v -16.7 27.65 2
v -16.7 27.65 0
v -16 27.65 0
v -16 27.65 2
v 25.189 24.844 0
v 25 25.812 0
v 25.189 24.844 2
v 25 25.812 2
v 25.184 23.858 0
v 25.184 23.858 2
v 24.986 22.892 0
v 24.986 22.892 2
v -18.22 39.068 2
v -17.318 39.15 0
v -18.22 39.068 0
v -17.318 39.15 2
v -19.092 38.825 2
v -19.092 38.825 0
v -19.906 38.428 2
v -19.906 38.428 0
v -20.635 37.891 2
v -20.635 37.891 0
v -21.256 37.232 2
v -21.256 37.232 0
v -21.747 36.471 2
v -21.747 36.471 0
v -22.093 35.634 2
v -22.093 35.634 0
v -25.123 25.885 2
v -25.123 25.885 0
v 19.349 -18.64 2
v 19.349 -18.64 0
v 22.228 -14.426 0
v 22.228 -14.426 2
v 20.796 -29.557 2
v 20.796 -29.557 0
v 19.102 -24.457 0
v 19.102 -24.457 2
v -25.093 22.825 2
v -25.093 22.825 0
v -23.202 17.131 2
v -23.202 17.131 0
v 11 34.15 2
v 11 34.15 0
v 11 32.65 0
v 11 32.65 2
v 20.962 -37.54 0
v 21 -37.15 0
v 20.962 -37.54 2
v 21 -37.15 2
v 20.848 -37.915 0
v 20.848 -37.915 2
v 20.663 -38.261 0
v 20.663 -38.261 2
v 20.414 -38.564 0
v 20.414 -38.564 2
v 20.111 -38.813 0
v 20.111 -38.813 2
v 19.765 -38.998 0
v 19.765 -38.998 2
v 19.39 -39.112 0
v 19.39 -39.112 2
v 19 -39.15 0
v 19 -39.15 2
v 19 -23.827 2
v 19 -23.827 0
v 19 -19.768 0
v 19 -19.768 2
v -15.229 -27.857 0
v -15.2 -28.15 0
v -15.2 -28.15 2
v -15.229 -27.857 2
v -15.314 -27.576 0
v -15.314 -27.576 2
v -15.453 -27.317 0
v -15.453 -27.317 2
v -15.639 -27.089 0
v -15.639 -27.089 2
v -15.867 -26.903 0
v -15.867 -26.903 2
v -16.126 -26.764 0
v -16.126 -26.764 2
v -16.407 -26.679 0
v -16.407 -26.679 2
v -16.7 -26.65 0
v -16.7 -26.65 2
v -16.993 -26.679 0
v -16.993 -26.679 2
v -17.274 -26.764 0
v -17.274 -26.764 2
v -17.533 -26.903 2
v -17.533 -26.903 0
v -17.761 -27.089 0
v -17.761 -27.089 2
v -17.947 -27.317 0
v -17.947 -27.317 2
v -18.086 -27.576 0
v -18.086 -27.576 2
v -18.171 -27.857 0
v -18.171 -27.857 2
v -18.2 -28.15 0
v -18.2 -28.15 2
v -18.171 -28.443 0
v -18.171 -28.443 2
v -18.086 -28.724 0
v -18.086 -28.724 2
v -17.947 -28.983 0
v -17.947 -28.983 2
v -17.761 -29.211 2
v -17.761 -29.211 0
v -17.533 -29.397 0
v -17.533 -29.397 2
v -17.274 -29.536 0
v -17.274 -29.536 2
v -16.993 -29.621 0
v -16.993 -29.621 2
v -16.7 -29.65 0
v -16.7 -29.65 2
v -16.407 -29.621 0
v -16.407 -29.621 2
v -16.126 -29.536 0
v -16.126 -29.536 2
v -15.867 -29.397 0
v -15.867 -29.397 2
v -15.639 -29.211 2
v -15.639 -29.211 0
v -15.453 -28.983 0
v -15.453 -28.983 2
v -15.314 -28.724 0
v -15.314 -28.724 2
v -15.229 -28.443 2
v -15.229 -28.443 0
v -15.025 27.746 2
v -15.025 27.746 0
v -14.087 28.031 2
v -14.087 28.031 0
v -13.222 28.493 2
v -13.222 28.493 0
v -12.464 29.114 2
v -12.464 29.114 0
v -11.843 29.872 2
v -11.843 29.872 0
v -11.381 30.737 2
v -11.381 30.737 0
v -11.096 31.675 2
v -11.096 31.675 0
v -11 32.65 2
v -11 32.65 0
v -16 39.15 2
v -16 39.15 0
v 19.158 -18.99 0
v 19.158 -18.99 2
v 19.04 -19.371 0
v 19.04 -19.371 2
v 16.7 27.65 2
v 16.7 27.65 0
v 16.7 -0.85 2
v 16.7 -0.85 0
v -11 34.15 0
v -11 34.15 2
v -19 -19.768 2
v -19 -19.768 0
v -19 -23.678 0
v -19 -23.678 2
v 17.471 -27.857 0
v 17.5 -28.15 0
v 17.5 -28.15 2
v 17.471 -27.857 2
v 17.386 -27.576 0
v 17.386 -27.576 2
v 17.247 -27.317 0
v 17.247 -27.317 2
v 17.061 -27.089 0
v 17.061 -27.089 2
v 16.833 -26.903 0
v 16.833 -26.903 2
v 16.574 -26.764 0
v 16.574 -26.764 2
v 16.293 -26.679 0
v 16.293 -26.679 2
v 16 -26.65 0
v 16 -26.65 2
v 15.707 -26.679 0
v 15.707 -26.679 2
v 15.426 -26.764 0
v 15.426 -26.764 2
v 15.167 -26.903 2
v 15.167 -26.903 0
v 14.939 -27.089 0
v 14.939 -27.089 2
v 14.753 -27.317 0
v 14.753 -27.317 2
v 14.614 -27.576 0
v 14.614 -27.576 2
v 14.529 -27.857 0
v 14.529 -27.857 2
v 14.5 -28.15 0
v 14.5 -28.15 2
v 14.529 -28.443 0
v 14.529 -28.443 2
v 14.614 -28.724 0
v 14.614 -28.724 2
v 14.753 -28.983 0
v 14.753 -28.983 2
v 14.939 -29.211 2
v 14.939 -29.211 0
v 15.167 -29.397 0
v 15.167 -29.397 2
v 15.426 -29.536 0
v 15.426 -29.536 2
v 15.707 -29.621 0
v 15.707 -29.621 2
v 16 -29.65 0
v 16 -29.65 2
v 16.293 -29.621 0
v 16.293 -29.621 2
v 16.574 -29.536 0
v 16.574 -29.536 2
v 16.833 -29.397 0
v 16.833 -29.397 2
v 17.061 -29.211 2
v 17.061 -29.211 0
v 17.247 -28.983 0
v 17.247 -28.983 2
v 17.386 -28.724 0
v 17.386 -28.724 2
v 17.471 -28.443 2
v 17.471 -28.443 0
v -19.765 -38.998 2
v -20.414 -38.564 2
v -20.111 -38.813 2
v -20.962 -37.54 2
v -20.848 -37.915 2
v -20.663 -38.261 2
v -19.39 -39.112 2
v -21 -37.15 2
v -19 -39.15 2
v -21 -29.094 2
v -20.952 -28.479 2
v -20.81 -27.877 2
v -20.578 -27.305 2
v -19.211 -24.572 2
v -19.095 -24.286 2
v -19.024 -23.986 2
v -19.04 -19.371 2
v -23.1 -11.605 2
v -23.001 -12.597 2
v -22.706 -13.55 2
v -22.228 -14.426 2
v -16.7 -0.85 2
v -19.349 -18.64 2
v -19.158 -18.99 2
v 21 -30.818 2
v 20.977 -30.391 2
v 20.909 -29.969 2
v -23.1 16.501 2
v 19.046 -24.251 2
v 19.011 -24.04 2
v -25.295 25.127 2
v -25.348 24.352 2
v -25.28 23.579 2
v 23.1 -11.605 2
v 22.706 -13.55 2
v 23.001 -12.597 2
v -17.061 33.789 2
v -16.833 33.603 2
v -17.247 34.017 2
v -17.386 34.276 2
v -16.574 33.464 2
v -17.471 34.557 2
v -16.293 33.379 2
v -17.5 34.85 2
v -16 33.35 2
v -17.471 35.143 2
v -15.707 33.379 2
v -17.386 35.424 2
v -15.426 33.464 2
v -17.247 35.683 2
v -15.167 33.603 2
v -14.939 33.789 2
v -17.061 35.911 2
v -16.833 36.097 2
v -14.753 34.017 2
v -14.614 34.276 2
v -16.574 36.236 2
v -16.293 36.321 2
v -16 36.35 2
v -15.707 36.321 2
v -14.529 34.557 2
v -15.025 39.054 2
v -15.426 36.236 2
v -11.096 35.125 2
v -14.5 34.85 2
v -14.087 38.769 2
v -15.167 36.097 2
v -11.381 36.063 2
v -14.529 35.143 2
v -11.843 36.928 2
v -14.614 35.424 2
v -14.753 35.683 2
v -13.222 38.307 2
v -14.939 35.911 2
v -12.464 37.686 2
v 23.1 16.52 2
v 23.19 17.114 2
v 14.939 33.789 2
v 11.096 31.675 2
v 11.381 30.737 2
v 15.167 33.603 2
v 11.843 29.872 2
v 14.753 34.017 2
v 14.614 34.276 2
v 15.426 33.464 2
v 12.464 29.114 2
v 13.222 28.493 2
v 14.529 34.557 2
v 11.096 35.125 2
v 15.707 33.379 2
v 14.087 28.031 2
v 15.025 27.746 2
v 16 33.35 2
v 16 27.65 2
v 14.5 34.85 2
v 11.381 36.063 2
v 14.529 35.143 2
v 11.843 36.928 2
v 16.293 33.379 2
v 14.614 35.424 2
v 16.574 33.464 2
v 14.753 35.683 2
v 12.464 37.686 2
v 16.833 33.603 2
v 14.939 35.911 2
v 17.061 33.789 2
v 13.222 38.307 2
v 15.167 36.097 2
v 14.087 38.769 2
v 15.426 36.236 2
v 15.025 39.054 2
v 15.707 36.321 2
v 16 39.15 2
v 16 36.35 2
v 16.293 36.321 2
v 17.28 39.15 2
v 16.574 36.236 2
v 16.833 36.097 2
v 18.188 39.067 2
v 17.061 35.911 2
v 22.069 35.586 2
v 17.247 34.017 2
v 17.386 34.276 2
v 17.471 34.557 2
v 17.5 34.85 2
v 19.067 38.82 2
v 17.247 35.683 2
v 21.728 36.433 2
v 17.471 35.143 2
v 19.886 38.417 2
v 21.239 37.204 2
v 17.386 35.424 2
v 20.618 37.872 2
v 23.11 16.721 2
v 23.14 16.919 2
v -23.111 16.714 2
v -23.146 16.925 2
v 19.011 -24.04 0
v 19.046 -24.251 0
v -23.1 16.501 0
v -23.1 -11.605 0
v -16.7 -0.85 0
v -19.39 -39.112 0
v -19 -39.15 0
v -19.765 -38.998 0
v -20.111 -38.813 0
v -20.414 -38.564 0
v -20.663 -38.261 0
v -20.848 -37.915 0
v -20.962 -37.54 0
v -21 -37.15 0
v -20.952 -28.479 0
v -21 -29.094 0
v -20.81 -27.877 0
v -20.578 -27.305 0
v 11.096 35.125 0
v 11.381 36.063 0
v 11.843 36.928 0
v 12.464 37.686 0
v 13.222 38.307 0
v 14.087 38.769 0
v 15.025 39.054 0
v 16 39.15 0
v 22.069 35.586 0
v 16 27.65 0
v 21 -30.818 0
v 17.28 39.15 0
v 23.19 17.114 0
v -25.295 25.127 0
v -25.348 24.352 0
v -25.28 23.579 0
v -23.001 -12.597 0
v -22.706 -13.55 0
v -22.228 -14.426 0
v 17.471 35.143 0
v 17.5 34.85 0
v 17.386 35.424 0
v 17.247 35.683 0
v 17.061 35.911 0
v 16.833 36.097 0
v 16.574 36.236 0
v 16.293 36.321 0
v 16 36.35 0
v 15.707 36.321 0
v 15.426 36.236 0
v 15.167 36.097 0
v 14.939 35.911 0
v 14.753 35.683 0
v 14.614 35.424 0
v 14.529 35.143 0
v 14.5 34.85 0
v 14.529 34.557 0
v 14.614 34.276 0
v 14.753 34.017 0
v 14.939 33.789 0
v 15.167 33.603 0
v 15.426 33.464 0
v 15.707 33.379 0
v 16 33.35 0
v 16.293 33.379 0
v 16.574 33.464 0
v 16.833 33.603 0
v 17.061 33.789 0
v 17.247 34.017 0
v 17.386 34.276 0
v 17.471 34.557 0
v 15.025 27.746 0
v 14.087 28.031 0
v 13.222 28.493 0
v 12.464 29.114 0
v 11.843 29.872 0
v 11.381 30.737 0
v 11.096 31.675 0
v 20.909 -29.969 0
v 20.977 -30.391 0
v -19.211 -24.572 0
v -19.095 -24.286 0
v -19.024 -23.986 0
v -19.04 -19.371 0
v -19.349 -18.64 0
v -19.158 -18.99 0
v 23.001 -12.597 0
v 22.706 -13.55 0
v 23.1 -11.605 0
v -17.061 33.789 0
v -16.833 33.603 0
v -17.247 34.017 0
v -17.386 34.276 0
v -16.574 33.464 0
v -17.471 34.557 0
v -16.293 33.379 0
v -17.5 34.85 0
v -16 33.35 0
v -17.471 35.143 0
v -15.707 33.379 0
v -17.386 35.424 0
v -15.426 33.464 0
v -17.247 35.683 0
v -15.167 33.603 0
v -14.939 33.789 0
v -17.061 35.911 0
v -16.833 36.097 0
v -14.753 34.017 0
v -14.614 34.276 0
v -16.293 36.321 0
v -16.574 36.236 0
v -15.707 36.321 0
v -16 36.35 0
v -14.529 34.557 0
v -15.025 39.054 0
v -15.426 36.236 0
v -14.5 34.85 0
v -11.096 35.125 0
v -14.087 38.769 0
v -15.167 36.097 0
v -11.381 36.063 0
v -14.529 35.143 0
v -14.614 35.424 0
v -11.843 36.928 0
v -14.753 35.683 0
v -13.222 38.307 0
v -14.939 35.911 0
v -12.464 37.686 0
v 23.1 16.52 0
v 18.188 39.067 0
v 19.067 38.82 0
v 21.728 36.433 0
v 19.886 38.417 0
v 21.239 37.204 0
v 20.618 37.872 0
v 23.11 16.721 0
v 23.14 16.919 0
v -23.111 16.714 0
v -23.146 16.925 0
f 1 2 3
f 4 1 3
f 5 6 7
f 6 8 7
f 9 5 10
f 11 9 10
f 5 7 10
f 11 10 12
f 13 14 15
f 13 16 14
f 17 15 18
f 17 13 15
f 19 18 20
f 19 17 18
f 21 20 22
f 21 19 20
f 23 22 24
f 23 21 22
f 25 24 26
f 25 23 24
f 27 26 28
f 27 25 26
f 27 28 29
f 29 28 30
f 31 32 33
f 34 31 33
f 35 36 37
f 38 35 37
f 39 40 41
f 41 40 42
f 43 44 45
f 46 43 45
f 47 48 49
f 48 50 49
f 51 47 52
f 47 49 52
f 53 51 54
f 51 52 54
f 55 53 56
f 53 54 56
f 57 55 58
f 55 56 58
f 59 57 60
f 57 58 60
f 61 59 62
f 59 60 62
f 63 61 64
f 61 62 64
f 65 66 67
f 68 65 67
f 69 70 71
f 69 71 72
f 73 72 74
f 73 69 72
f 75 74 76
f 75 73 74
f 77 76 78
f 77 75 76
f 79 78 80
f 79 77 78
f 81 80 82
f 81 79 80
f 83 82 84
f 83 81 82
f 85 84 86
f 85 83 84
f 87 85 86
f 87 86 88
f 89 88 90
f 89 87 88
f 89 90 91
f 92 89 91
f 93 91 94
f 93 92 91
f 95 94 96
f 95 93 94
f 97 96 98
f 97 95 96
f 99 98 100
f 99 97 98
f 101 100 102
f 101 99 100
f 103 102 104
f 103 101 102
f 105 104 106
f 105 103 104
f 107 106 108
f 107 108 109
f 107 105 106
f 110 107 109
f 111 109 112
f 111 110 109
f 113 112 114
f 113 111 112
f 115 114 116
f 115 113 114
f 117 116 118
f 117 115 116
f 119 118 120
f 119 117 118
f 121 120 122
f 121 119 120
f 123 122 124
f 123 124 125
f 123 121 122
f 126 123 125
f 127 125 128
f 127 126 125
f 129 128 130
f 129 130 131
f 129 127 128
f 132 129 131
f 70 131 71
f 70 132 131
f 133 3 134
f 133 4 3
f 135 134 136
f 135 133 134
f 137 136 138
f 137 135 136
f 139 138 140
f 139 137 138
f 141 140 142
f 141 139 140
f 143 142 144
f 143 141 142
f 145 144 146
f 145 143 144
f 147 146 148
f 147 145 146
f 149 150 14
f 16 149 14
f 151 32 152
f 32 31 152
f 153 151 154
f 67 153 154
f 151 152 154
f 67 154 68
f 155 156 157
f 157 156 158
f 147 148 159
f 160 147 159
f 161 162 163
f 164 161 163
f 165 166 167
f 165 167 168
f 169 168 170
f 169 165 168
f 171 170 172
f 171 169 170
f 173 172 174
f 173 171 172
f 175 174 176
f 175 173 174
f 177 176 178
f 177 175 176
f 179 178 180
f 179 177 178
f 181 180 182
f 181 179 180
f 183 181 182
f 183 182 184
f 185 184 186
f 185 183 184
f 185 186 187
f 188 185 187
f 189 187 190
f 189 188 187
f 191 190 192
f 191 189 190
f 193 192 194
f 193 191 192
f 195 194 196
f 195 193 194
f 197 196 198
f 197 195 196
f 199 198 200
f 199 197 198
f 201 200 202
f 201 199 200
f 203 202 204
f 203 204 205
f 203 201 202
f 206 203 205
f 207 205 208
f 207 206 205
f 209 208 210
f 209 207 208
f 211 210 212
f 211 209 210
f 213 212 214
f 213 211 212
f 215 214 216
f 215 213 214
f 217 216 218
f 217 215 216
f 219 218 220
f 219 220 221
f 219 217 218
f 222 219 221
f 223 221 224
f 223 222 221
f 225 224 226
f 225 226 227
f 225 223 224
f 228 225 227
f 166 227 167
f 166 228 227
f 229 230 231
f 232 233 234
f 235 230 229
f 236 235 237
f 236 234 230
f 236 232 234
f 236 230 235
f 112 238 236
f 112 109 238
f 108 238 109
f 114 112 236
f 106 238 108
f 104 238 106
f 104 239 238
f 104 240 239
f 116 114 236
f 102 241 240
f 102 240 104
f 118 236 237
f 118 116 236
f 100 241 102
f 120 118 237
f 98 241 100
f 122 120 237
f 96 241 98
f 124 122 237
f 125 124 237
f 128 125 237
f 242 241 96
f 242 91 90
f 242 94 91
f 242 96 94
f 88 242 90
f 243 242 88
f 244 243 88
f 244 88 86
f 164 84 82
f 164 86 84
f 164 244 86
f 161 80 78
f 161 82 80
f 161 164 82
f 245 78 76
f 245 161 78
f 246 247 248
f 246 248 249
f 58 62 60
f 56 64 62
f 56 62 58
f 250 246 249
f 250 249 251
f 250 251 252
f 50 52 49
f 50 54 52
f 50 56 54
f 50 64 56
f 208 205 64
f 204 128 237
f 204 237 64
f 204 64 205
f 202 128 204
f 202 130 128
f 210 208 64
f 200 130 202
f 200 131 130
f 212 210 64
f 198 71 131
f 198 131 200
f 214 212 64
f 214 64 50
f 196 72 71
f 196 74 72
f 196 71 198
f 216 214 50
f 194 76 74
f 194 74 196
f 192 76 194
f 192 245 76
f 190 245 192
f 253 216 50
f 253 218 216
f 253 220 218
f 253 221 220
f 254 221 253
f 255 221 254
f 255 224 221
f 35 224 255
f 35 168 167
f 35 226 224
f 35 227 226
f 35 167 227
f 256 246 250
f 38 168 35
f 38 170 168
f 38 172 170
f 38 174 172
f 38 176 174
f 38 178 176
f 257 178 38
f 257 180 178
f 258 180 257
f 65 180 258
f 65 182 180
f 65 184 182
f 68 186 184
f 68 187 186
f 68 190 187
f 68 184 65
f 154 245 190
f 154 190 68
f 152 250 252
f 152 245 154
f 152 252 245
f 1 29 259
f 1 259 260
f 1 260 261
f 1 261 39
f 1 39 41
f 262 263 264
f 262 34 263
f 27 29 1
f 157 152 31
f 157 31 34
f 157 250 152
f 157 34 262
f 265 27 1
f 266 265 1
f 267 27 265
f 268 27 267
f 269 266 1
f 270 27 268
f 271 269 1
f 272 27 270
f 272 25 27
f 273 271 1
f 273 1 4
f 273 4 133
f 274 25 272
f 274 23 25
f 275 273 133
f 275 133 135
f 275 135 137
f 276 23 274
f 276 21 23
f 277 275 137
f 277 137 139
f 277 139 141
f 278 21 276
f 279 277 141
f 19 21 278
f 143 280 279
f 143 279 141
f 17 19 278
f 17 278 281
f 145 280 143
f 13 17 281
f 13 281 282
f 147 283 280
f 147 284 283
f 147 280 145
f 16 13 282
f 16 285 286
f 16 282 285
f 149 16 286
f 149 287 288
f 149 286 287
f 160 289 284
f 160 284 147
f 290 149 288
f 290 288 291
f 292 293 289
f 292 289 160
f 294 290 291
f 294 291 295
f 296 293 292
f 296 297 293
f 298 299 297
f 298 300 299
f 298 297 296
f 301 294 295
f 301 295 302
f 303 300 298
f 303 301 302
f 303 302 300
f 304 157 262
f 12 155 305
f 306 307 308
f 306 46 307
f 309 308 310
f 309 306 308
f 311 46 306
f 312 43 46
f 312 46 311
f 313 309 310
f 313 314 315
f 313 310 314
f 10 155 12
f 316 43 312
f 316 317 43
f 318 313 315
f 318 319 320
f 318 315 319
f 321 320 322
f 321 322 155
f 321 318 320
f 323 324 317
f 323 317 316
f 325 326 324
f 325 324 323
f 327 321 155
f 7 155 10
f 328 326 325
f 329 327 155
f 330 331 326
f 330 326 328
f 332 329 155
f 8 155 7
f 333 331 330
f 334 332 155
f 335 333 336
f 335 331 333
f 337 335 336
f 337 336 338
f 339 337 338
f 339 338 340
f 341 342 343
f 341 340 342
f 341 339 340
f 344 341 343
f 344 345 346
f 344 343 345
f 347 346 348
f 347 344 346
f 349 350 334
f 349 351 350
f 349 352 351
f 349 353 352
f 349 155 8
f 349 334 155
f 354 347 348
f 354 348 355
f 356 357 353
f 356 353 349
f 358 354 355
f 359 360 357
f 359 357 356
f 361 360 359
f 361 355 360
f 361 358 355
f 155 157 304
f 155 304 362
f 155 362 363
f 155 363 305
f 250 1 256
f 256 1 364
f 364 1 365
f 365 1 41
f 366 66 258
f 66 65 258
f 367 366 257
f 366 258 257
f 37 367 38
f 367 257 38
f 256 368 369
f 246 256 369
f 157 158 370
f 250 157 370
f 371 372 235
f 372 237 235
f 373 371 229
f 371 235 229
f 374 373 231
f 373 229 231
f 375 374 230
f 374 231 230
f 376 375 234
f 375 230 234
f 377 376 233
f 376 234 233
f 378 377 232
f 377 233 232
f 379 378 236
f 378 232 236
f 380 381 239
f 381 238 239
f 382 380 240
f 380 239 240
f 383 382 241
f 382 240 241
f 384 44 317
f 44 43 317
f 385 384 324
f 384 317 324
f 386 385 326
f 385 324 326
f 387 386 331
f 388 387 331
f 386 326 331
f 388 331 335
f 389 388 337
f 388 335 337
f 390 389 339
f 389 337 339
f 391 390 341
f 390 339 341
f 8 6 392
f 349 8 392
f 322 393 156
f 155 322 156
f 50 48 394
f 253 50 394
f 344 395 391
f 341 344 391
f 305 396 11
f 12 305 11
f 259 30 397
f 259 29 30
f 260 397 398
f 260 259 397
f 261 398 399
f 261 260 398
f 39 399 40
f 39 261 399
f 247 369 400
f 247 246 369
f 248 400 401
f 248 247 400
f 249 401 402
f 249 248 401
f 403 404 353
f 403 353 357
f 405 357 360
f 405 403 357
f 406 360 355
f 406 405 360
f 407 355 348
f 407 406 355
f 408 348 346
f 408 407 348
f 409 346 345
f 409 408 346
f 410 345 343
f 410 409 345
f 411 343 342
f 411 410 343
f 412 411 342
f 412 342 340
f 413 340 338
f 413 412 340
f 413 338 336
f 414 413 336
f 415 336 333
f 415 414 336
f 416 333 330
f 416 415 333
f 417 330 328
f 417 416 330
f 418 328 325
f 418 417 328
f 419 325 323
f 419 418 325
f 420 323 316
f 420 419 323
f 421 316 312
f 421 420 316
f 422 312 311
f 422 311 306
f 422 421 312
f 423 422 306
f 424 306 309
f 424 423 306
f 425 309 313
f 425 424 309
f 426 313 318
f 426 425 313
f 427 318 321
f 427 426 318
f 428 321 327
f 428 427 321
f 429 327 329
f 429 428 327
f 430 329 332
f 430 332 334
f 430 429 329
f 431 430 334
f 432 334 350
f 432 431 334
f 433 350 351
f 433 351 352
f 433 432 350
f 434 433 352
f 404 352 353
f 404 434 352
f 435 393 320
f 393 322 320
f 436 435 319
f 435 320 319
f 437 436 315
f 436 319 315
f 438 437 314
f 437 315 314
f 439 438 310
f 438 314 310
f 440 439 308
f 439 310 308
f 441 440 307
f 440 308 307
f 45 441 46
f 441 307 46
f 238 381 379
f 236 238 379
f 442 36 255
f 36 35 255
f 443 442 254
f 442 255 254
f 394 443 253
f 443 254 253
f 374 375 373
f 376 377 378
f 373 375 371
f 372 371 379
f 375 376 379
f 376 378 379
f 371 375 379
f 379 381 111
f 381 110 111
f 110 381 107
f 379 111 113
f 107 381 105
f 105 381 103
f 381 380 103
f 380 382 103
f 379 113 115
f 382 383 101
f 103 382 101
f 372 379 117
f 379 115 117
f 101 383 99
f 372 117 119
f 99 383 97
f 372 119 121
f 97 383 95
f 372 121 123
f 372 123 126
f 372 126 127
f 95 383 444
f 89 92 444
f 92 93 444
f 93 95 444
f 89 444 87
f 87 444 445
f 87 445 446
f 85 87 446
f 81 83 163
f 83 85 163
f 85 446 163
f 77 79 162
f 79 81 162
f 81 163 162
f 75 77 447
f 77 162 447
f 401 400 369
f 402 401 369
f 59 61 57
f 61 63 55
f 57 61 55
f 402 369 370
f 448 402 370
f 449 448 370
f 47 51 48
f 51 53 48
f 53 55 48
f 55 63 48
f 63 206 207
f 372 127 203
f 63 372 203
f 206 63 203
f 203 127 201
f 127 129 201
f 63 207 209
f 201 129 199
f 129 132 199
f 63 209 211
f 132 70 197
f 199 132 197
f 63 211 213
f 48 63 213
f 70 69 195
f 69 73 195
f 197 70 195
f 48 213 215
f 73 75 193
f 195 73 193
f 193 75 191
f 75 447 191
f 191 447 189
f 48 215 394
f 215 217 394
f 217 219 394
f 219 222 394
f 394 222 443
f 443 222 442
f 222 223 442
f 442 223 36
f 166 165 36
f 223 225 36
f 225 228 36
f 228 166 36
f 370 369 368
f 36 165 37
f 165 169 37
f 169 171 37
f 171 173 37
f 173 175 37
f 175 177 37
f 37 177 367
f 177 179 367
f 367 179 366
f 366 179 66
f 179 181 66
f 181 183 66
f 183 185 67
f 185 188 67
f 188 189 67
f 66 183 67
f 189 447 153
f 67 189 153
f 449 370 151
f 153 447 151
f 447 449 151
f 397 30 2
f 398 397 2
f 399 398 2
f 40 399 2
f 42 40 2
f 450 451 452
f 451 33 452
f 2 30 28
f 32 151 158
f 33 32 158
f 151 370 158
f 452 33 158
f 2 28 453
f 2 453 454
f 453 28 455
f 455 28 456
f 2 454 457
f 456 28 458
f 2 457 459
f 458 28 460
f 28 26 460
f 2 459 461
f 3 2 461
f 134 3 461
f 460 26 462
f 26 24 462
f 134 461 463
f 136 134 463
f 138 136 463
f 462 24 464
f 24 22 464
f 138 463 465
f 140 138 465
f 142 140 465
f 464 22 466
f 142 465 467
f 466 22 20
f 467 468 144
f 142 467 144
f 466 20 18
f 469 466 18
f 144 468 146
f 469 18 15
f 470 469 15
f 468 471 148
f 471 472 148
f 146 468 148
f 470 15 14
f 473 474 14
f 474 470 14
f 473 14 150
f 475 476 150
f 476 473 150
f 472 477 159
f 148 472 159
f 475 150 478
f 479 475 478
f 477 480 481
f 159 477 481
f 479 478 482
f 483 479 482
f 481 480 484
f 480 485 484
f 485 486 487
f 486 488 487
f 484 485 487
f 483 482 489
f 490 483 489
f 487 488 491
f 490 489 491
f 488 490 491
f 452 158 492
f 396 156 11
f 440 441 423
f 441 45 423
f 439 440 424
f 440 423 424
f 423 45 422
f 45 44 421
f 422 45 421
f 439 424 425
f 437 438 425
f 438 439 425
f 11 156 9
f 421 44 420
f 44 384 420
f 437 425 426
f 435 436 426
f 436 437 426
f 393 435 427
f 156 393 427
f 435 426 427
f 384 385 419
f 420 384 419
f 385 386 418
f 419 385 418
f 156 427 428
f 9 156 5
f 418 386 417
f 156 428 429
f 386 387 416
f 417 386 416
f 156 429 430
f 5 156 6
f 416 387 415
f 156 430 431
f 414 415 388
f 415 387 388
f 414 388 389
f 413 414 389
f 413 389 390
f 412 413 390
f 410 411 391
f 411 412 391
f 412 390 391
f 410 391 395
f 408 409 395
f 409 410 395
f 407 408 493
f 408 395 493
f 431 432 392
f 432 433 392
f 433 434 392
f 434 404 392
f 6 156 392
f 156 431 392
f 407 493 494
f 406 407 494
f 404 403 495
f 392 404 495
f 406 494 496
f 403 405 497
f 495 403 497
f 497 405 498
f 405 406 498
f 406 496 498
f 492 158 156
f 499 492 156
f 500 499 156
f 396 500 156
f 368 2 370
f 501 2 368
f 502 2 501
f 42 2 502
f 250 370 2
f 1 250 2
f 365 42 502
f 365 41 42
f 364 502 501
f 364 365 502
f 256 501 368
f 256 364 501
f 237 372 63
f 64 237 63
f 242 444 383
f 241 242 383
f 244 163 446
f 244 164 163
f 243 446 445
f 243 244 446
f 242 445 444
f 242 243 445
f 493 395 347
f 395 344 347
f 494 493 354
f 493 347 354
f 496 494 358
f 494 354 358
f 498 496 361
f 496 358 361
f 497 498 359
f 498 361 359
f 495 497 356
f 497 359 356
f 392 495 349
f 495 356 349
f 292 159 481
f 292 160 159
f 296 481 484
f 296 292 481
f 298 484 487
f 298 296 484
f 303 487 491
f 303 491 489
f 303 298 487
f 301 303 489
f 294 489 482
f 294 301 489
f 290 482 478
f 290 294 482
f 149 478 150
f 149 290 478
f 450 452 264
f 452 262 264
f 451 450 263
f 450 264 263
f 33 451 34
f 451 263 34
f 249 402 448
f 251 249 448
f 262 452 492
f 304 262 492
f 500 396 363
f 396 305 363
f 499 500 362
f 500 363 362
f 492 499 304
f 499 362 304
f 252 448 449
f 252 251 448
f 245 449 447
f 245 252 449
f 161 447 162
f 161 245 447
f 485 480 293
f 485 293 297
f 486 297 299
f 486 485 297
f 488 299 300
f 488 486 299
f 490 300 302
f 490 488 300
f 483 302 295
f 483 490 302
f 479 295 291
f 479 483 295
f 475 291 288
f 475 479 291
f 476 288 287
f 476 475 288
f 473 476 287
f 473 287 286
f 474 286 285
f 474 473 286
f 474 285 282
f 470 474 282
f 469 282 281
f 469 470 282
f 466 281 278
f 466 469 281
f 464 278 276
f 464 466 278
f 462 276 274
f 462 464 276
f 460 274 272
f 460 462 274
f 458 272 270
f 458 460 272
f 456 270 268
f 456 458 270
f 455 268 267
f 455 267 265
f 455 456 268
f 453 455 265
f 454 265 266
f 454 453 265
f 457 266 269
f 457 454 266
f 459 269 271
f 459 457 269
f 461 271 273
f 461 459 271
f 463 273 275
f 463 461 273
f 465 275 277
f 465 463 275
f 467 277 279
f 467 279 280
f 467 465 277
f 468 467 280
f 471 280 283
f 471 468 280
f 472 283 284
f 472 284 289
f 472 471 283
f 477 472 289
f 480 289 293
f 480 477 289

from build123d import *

# Parameters (mm, degrees)
F0_R     = 1.5
F1_DEPTH = 2
F2_R     = 5
F3_R     = 2
F4_R     = 4


with BuildPart() as f1:
    # F0 (on Top) → F1 (new body)
    with BuildSketch(Plane.XY):
        Polygon((16.7, -0.85), (-16.7, -0.85), (-16.7, 27.65), (-11, 27.65), (-11, 39.15), (-21, 39.15), (-25.6, 24.35), (-23.1, 16.824023), (-23.1, -13.15), (-19, -19.15), (-19, -24.15), (-21, -28.15), (-21, -39.15), (21, -39.15), (21, -30.170781), (19, -24.15), (19, -19.15), (23.1, -13.15), (23.1, 16.824023), (25.439155, 24.35), (21, 39.15), (11, 39.15), (11, 27.65), (16.7, 27.65), align=None)
        with Locations((-16.7, -28.15)):
            Circle(F0_R, mode=Mode.SUBTRACT)
        with Locations((16, -28.15)):
            Circle(F0_R, mode=Mode.SUBTRACT)
        with Locations((-16, 34.85)):
            Circle(F0_R, mode=Mode.SUBTRACT)
        with Locations((16, 34.85)):
            Circle(F0_R, mode=Mode.SUBTRACT)
    extrude(amount=F1_DEPTH)

    # F2
    f2_edges = [f1.edges().sort_by_distance(p)[0] for p in [
        (-11, 27.65, 1),
        (11, 27.65, 1),
        (11, 39.15, 1),
        (21, 39.15, 1),
        (-11, 39.15, 1),
        (-21, 39.15, 1),
        (-25.6, 24.35, 1),
        (25.439155, 24.35, 1),
        (23.1, -13.15, 1),
        (-23.1, -13.15, 1),
    ]]
    fillet(f2_edges, radius=F2_R)

    # F3
    f3_edges = [f1.edges().sort_by_distance(p)[0] for p in [
        (23.1, 16.824023, 1),
        (-23.1, 16.824023, 1),
        (-19, -19.15, 1),
        (-19, -24.15, 1),
        (19, -19.15, 1),
        (19, -24.15, 1),
        (21, -39.15, 1),
        (-21, -39.15, 1),
    ]]
    fillet(f3_edges, radius=F3_R)

    # F4
    f4_edges = [f1.edges().sort_by_distance(p)[0] for p in [
        (-21, -28.15, 1),
        (21, -30.170781, 1),
    ]]
    fillet(f4_edges, radius=F4_R)


solid = f1.part
